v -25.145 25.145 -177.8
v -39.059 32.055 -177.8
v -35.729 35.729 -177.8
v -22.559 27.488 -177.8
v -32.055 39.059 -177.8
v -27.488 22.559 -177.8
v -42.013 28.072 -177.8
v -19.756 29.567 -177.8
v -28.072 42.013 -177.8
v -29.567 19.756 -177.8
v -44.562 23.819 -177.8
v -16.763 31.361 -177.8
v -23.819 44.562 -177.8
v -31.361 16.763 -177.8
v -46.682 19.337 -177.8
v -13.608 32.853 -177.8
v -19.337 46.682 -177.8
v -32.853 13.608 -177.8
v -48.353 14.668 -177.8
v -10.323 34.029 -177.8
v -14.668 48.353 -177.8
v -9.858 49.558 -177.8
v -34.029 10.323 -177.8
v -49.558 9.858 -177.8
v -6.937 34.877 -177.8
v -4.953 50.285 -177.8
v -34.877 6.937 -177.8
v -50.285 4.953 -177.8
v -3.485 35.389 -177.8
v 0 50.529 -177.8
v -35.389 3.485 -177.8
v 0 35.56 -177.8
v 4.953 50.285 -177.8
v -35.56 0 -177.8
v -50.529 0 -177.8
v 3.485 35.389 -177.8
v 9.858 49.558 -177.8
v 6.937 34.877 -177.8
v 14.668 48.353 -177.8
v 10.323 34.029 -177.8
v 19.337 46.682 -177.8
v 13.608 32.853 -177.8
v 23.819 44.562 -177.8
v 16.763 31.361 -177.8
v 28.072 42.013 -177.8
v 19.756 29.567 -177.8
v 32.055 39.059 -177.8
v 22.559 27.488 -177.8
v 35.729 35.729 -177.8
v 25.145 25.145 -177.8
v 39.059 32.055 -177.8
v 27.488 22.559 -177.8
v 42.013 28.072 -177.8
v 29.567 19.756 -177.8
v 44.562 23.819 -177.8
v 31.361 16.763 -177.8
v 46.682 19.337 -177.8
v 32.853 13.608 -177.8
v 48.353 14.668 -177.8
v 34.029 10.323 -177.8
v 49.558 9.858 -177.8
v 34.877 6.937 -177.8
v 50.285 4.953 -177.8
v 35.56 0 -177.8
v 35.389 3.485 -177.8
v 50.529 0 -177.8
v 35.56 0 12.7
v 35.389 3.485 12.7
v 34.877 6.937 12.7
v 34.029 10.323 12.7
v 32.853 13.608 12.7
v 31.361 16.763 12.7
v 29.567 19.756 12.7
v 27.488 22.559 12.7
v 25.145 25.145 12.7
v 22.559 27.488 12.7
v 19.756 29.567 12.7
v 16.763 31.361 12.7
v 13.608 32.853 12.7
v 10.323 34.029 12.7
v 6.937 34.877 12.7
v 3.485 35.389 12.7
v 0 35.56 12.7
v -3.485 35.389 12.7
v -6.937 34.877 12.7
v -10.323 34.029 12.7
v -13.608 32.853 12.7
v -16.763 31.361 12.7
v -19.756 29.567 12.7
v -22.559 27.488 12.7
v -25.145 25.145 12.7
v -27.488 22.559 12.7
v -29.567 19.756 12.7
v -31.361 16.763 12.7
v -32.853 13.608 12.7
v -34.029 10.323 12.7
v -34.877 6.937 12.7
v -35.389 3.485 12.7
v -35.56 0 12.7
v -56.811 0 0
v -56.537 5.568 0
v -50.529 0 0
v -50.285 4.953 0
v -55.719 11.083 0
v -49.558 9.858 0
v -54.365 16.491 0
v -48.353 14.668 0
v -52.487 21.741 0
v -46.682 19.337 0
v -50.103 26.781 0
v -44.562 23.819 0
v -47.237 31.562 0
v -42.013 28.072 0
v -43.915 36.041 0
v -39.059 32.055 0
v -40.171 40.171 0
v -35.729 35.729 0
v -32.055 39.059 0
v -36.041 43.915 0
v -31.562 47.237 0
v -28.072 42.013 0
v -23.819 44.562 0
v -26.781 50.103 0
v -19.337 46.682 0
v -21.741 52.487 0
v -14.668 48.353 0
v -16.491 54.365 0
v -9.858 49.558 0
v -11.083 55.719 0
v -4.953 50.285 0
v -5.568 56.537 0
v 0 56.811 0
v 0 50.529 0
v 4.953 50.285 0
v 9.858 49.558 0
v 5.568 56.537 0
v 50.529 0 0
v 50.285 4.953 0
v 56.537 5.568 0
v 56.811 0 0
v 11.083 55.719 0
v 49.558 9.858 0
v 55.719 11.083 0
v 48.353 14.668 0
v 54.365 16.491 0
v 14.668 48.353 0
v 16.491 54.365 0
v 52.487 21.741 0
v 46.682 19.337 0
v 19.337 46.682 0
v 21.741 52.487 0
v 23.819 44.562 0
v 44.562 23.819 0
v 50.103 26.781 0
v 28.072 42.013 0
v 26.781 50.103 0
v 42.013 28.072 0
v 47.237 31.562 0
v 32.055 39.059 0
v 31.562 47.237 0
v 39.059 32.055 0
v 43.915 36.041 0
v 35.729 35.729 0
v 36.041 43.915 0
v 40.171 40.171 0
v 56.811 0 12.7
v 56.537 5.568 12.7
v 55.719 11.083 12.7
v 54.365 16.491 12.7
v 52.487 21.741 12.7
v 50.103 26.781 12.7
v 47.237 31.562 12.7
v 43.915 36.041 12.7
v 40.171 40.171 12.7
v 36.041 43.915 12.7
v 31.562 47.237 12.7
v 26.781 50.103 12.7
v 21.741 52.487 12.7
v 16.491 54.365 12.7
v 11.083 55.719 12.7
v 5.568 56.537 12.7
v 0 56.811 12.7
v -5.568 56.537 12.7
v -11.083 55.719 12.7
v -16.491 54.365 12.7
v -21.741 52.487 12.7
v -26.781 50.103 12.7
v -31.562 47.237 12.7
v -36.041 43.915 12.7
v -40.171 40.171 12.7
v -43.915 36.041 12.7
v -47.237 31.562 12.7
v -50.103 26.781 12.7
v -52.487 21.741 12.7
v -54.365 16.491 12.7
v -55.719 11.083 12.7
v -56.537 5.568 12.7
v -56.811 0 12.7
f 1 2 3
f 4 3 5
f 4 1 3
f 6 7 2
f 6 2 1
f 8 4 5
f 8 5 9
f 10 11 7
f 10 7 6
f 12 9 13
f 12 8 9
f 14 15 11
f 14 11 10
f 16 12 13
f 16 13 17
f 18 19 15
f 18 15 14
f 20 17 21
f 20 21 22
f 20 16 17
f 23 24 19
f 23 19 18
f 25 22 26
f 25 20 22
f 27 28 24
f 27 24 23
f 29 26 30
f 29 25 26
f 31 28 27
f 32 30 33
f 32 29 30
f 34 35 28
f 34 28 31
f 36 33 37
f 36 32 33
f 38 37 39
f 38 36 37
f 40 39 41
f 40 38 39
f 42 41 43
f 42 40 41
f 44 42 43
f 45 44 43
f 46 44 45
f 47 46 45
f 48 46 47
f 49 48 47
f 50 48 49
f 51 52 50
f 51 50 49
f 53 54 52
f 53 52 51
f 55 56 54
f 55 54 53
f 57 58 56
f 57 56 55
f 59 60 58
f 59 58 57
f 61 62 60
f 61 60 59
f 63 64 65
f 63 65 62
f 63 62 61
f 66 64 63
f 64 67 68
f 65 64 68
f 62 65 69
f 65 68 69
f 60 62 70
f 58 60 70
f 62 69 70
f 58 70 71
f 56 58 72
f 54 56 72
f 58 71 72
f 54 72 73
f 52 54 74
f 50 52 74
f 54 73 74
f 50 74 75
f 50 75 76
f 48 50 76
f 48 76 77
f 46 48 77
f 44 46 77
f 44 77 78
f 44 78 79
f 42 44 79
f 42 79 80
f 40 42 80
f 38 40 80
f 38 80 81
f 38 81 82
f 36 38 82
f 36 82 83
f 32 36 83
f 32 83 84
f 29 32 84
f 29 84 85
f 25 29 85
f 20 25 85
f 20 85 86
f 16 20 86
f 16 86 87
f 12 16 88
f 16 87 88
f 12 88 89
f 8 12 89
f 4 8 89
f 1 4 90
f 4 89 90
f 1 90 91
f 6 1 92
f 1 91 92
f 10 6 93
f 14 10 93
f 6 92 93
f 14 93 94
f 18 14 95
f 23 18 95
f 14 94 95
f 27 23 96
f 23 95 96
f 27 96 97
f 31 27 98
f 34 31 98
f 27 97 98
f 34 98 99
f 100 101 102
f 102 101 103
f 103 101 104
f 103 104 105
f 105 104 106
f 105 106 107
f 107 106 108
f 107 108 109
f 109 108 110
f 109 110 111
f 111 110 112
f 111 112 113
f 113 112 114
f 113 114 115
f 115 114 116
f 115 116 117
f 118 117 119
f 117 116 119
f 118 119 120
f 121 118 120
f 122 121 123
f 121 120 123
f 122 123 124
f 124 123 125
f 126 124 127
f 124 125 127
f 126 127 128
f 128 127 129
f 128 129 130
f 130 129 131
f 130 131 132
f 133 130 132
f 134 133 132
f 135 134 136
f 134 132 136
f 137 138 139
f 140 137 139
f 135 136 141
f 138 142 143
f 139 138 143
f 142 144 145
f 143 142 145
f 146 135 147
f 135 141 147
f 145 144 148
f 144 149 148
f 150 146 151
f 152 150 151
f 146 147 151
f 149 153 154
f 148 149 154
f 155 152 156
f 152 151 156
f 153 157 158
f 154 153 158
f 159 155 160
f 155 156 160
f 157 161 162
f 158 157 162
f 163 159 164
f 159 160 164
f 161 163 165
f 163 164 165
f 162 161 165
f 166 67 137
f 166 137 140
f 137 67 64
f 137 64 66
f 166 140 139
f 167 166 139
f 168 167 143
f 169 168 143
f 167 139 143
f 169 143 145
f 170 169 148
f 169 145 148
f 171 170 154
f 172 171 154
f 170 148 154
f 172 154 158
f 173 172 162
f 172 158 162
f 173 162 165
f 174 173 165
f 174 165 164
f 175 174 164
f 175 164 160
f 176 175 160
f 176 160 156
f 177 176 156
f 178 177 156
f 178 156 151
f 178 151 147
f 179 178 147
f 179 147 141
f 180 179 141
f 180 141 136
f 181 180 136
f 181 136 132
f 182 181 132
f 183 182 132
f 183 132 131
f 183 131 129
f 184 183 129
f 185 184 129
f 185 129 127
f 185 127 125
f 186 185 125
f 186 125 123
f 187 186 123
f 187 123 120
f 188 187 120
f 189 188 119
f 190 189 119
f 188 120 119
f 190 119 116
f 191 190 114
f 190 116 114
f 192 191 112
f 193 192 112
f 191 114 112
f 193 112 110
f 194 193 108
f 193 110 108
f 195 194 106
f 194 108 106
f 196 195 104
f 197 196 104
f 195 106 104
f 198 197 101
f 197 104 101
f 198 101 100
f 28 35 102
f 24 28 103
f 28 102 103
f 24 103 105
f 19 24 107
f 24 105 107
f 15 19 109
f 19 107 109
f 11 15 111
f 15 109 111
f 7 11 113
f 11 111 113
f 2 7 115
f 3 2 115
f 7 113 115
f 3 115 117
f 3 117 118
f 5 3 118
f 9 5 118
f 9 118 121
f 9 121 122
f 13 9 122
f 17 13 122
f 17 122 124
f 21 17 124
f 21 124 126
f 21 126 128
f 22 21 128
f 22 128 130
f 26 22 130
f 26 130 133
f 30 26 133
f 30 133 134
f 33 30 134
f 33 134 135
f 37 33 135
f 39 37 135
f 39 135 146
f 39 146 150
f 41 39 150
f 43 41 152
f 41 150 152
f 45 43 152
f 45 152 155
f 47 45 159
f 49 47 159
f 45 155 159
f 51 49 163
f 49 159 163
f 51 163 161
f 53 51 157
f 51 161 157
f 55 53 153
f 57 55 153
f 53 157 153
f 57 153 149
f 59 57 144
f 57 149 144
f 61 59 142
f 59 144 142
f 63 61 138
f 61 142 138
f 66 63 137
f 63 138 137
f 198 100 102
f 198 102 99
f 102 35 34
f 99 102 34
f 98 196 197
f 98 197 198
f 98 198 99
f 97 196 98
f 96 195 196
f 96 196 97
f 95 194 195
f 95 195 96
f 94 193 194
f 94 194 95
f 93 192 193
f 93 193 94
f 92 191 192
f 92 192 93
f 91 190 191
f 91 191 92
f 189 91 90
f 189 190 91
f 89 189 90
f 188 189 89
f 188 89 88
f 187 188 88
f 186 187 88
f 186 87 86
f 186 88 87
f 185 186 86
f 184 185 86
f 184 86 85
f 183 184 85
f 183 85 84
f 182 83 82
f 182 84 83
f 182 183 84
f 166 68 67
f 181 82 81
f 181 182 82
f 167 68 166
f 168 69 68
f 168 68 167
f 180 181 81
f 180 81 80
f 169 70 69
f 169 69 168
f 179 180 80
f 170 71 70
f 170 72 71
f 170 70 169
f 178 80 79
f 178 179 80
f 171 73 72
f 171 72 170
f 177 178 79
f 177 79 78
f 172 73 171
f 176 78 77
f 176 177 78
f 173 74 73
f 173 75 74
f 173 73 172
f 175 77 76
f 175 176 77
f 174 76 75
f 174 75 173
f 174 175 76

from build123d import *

# Parameters (mm, degrees)
F0_R          = 56.8109783896
F1_DEPTH      = 12.7
F2_R          = 50.5287562703
F3_DEPTH      = 177.8
F4_R          = 35.56
F5_DEPTH      = 203.2
F6_W          = 133.571790182
F6_H          = 62.377858907
F7_DEPTH      = 203.2
F7_DEPTH_BACK = 25.4


with BuildPart() as f1:
    # F0 (on Top) → F1 (new body)
    with BuildSketch(Plane.XY):
        Circle(F0_R)
    extrude(amount=F1_DEPTH)

    # F2 (on face) → F3 (join)
    with BuildSketch(Plane(origin=(0, 0, 0), x_dir=(1, 0, 0), z_dir=(0, 0, -1))):
        Circle(F2_R)
    extrude(amount=F3_DEPTH)

    # F4 (on face) → F5 (cut)
    with BuildSketch(Plane.XY.offset(12.7)):
        Circle(F4_R)
    extrude(amount=-F5_DEPTH, mode=Mode.SUBTRACT)

    # F6 (on Top) → F7 (cut, two sides)
    with BuildSketch(Plane.XY) as f7_sk:
        with Locations((2.2456042352, -31.1889294535)):
            Rectangle(F6_W, F6_H)
    extrude(amount=-F7_DEPTH, mode=Mode.SUBTRACT)
    extrude(f7_sk.sketch, amount=F7_DEPTH_BACK, mode=Mode.SUBTRACT)


solid = f1.part
